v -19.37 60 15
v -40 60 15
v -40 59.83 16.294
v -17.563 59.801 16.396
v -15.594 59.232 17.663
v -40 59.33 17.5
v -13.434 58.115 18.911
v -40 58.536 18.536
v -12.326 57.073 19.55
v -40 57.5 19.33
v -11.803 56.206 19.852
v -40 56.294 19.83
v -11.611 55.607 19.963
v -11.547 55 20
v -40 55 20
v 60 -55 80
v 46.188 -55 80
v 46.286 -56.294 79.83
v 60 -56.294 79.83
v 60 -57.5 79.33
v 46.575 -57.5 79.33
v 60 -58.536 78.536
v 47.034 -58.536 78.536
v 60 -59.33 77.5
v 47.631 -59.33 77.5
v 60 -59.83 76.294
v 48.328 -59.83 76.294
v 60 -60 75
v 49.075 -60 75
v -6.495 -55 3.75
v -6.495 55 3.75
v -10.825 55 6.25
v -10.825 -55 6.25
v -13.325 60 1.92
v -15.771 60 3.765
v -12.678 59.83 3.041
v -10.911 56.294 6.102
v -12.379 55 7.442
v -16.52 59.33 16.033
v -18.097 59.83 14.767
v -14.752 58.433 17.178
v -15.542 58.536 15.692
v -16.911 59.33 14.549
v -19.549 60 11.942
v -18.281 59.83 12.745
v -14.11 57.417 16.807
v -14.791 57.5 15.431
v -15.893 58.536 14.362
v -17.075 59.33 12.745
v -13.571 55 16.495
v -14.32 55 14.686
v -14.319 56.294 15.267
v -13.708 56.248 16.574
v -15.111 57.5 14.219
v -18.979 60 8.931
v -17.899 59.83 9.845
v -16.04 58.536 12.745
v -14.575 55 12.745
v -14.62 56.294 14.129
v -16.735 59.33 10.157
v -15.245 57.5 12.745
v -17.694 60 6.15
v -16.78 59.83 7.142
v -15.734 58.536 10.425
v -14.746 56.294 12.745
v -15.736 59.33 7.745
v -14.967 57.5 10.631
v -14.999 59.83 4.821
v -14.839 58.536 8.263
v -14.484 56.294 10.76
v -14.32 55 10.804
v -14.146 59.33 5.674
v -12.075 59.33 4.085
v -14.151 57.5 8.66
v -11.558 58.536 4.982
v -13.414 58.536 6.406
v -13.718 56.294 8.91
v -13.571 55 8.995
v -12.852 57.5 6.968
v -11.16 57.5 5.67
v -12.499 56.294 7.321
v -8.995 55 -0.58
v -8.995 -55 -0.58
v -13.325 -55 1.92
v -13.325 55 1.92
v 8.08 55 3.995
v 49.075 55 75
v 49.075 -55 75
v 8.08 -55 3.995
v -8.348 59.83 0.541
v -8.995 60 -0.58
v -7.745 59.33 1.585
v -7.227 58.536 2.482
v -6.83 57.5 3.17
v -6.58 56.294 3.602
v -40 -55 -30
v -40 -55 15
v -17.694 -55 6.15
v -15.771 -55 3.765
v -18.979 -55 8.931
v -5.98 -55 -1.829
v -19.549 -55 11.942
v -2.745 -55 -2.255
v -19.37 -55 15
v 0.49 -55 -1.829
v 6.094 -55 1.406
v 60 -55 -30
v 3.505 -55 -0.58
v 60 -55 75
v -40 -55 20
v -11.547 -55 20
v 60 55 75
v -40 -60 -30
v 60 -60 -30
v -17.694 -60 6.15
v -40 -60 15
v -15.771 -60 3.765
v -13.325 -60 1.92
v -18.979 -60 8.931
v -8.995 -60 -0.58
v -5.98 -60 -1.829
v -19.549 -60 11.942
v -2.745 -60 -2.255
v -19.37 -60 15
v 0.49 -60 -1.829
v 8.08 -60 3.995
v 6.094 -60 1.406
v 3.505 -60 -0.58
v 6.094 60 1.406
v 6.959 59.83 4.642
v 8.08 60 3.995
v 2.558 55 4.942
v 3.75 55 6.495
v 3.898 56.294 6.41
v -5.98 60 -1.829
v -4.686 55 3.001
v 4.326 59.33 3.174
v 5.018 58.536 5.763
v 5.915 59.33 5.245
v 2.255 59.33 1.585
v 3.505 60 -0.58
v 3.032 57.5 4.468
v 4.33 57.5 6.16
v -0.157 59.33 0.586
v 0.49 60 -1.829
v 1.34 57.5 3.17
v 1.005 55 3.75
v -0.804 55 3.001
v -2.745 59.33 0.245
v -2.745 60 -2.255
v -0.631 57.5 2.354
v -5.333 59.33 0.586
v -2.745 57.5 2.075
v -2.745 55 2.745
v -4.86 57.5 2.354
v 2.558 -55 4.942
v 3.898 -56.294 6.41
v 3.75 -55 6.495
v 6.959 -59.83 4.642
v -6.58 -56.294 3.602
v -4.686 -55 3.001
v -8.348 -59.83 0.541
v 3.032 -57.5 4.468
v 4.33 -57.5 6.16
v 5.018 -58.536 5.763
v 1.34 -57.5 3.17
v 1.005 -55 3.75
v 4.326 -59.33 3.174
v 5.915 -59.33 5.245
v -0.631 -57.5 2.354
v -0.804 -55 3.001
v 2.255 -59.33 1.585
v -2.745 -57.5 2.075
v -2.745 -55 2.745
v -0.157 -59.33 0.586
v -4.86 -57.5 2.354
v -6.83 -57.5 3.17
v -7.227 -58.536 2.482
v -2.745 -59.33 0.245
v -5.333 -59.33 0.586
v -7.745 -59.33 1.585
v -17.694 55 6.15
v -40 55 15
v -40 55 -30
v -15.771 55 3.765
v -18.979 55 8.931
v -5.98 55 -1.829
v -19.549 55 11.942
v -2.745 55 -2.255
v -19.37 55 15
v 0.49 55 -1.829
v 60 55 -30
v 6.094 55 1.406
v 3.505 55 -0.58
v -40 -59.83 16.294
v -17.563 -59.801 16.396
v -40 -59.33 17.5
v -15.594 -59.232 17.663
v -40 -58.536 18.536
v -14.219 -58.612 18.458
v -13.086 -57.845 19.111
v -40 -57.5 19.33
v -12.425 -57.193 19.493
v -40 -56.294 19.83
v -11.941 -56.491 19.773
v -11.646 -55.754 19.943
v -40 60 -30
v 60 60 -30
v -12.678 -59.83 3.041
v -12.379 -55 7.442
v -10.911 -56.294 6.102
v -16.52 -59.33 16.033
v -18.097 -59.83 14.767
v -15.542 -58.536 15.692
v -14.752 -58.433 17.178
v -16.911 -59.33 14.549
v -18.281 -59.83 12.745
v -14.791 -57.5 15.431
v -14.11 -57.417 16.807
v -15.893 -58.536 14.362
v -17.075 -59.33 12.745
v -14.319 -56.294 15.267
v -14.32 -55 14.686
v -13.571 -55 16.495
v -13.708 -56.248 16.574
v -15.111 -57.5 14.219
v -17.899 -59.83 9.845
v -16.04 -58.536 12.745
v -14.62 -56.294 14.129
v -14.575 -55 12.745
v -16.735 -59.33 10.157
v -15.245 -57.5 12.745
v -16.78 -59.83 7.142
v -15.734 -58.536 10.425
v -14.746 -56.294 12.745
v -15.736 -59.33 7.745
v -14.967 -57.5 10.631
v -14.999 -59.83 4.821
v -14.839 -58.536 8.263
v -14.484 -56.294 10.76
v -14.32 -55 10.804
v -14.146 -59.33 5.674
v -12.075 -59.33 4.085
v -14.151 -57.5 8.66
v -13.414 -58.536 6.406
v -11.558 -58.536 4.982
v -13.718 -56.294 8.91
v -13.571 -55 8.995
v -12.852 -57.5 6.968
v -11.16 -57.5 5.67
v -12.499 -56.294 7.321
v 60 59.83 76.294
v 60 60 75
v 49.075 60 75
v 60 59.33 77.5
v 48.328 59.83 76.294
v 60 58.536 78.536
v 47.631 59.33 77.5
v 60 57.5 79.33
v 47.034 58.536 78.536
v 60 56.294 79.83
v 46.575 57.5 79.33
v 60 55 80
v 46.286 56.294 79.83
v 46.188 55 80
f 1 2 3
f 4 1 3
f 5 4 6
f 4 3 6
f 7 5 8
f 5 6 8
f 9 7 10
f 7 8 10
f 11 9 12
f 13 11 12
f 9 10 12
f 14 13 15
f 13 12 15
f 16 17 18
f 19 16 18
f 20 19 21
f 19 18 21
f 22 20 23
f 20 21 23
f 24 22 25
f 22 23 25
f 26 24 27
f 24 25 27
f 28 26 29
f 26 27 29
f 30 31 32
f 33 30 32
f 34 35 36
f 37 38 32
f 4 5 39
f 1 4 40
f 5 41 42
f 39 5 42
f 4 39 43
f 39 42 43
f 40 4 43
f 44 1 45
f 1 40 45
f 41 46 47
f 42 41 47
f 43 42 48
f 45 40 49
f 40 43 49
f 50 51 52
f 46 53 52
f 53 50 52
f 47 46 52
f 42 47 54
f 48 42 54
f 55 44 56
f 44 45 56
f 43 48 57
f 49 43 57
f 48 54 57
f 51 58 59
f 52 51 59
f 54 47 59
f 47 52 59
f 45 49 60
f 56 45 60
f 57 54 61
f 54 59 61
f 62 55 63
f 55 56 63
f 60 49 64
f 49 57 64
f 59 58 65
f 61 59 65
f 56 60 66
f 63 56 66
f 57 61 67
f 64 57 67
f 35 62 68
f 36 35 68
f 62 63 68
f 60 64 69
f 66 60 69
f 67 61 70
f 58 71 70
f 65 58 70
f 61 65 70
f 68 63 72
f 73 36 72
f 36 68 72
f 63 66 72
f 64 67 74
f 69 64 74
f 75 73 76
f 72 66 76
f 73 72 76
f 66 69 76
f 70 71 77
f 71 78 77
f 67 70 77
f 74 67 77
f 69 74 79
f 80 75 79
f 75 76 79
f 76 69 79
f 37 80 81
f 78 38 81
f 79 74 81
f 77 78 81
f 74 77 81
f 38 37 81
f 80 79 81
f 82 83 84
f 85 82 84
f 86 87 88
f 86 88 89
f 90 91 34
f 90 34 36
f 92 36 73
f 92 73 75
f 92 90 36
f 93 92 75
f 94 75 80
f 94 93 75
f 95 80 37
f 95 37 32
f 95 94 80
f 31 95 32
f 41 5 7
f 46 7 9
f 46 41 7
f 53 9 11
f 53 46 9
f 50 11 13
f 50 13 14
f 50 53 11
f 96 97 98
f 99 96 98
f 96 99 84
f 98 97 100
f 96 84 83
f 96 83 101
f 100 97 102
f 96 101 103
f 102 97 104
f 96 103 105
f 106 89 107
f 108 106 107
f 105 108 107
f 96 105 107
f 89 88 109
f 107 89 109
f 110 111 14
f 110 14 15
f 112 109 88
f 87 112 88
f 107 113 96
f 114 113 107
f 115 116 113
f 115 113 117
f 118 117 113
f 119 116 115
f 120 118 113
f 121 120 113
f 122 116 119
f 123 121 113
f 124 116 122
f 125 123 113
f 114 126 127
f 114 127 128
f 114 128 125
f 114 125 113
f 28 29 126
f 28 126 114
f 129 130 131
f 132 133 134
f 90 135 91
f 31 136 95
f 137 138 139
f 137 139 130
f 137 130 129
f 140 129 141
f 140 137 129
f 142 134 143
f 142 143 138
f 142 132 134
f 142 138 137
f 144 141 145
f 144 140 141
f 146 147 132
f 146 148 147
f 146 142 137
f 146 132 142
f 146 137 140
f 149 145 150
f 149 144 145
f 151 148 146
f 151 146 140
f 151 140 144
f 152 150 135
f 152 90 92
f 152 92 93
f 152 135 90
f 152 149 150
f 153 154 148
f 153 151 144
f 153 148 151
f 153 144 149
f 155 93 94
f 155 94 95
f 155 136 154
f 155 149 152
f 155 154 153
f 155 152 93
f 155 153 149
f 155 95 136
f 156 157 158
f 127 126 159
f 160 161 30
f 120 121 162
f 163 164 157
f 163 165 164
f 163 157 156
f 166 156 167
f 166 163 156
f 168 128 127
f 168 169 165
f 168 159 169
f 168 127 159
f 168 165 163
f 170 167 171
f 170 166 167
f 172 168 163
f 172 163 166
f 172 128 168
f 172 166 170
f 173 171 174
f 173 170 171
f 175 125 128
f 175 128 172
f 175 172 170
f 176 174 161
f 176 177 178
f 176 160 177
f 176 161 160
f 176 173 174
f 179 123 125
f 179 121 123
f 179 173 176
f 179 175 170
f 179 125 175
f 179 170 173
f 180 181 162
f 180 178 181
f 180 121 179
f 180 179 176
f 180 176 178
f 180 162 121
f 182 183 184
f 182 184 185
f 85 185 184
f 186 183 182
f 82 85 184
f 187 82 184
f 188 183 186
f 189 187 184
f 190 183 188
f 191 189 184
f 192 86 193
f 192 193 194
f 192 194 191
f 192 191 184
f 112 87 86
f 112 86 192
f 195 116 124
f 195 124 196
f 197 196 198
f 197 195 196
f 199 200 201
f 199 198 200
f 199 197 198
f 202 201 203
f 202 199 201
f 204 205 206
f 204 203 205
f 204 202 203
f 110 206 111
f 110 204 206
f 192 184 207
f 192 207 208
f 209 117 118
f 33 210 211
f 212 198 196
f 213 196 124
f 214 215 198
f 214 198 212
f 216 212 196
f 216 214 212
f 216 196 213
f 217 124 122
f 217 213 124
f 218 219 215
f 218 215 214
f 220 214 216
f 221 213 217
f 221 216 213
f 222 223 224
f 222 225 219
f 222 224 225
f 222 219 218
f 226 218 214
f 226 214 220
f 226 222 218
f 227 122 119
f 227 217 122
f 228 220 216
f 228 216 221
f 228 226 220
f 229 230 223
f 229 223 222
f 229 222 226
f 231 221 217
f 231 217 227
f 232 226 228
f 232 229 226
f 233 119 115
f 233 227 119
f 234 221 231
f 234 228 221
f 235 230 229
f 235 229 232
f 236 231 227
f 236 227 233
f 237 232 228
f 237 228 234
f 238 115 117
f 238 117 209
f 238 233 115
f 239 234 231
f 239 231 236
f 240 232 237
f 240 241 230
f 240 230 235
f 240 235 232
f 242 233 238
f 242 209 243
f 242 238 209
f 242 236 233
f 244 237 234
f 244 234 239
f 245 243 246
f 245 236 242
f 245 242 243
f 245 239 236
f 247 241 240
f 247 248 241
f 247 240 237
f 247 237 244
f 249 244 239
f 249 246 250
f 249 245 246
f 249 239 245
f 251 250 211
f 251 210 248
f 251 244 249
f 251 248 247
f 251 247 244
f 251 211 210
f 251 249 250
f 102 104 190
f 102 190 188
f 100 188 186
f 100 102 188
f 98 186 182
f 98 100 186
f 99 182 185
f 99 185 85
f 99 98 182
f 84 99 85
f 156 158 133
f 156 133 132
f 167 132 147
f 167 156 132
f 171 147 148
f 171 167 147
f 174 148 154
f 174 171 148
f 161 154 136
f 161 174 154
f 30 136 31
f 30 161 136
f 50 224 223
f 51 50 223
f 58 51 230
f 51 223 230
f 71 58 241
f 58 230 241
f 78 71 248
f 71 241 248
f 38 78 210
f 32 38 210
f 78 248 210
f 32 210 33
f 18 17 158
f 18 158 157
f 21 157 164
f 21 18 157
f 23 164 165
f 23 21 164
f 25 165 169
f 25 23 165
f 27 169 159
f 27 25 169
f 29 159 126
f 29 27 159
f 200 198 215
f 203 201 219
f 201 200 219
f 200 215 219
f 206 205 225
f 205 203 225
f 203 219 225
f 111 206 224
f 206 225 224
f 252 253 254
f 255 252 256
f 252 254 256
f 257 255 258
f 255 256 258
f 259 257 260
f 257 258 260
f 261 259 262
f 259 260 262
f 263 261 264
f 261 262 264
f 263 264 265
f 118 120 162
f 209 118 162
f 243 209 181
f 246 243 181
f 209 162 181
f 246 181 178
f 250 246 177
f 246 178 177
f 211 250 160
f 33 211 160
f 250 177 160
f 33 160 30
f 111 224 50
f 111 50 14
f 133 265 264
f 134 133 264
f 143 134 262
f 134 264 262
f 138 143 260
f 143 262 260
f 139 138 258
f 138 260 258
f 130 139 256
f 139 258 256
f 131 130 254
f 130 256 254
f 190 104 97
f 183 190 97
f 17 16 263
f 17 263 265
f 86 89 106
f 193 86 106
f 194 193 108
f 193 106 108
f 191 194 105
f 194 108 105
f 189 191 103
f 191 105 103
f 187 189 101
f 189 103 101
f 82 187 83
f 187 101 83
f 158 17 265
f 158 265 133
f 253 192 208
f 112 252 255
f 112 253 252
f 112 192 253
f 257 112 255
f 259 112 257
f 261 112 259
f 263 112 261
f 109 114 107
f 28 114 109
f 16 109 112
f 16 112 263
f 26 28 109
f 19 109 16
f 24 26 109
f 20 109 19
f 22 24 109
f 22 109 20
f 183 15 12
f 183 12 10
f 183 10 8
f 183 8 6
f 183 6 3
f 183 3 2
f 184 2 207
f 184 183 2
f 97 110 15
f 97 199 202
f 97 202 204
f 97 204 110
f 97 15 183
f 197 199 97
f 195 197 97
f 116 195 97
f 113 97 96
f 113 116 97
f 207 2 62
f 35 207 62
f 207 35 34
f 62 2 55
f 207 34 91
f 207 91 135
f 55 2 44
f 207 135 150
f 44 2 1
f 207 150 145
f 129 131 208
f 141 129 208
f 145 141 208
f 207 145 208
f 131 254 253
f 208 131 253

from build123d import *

# Parameters (mm, degrees)
F0_W         = 60
F0_H         = 30
F1_DEPTH     = 60
F2_R         = 7.5
F3_T1_DEPTH  = 38.8119784648
F3_T3_DEPTH  = 97.3760430703
F3_T5_DEPTH  = 5
F3_T7_DEPTH  = 16.5470053838
F3_T9_DEPTH  = 53.4529946162
F3_T12_ANGLE = 90
F3_T14_ANGLE = 90
F3_T16_ANGLE = 90
F3_T18_ANGLE = 90
F4_T         = 5


# Not quite as in the source:
# - a fillet or chamfer that OpenCascade refuses, or shapes differently, is made with other operations: its cross-section is extruded or revolved along the edge and cut away or added
# - a shell that OpenCascade refuses in one call is made with other operations: the cavity is built on its own and cut out


with BuildPart() as f1:
    # F0 (on Front) → F1 (new body, symmetric)
    with BuildSketch(Plane.XZ):
        Polygon((46.1880215352, 80), (0, 0), (60, 0), (60, 80), align=None)
        with Locations((30, -15)):
            Rectangle(F0_W, F0_H)
        Polygon((0, -30), (0, 0), (-17.3205080757, 10), (-11.5470053838, 20), (-40, 20), (-40, -30), align=None)
    extrude(amount=F1_DEPTH, both=True)

    # F2
    f2_edges = [f1.edges().sort_by_distance(p)[0] for p in [
        (-17.320508, 0, 10),
        (0, 0, 0),
    ]]
    fillet(f2_edges, radius=F2_R)

    # F3: fillet of radius 5 on 14 edges, made by hand

    # F3_s2 → F3_t1 (cut)
    with BuildSketch(Plane.YZ.offset(33.6880215352)):
        with BuildLine():
            ThreePointArc((-55, 80), (-58.5355339059, 78.5355339059), (-60, 75))
            Line((-60, 75), (-60, 80))
            Line((-60, 80), (-55, 80))
        make_face()
        with BuildLine():
            ThreePointArc((60, 75), (58.5355339059, 78.5355339059), (55, 80))
            Line((55, 80), (60, 80))
            Line((60, 80), (60, 75))
        make_face()
    extrude(amount=F3_T1_DEPTH, mode=Mode.SUBTRACT)

    # F3_s4 → F3_t3 (cut)
    with BuildSketch(Plane(origin=(52.4380215352, 0, 90.8253175473), x_dir=(0, 1, 0), z_dir=(-0.5, 0, -0.8660254038))):
        with BuildLine():
            ThreePointArc((-55, 0), (-58.5355339059, 1.4644660941), (-60, 5))
            Line((-60, 5), (-60, 0))
            Line((-60, 0), (-55, 0))
        make_face()
        with BuildLine():
            ThreePointArc((55, 0), (58.5355339059, 1.4644660941), (60, 5))
            Line((60, 5), (60, 0))
            Line((60, 0), (55, 0))
        make_face()
    extrude(amount=F3_T3_DEPTH, mode=Mode.SUBTRACT)

    # F3_s6 → F3_t5 (cut)
    with BuildSketch(Plane(origin=(-6.4951905284, 0, 3.75), x_dir=(0, 1, 0), z_dir=(-0.8660254038, 0, 0.5))):
        with BuildLine():
            ThreePointArc((-60, 5), (-58.5355339059, 1.4644660941), (-55, 0))
            Line((-55, 0), (-60, 0))
            Line((-60, 0), (-60, 5))
        make_face()
        with BuildLine():
            ThreePointArc((60, 5), (58.5355339059, 1.4644660941), (55, 0))
            Line((55, 0), (60, 0))
            Line((60, 0), (60, 5))
        make_face()
    extrude(amount=F3_T5_DEPTH, mode=Mode.SUBTRACT)

    # F3_s8 → F3_t7 (cut)
    with BuildSketch(Plane(origin=(3.75, 0, 6.4951905284), x_dir=(0, 1, 0), z_dir=(0.5, 0, 0.8660254038))):
        with BuildLine():
            ThreePointArc((-60, 25), (-58.5355339059, 21.4644660941), (-55, 20))
            Line((-55, 20), (-60, 20))
            Line((-60, 20), (-60, 25))
        make_face()
        with BuildLine():
            ThreePointArc((60, 25), (58.5355339059, 21.4644660941), (55, 20))
            Line((55, 20), (60, 20))
            Line((60, 20), (60, 25))
        make_face()
    extrude(amount=F3_T7_DEPTH, mode=Mode.SUBTRACT)

    # F3_s10 → F3_t9 (cut)
    with BuildSketch(Plane.YZ.offset(-52.5)):
        with BuildLine():
            ThreePointArc((-60, 15), (-58.5355339059, 18.5355339059), (-55, 20))
            Line((-55, 20), (-60, 20))
            Line((-60, 20), (-60, 15))
        make_face()
        with BuildLine():
            ThreePointArc((60, 15), (58.5355339059, 18.5355339059), (55, 20))
            Line((55, 20), (60, 20))
            Line((60, 20), (60, 15))
        make_face()
    extrude(amount=F3_T9_DEPTH, mode=Mode.SUBTRACT)

    # F3_s11 → F3_t12 (revolve, cut)
    with BuildSketch(Plane(origin=(3.75, 0, 6.4951905284), x_dir=(0, 1, 0), z_dir=(0.5, 0, 0.8660254038))):
        with BuildLine():
            ThreePointArc((60, -5), (58.5355339059, -1.4644660941), (55, 0))
            Line((55, 0), (60, 0))
            Line((60, 0), (60, -5))
        make_face()
    revolve(axis=Axis((-2.7451905284, 60, 10.2451905284), (0, 1, 0)), revolution_arc=F3_T12_ANGLE, mode=Mode.SUBTRACT)

    # F3_s13 → F3_t14 (revolve, cut)
    with BuildSketch(Plane(origin=(3.75, 0, 6.4951905284), x_dir=(0, 1, 0), z_dir=(0.5, 0, 0.8660254038))):
        with BuildLine():
            ThreePointArc((60, 25), (58.5355339059, 21.4644660941), (55, 20))
            Line((55, 20), (60, 20))
            Line((60, 20), (60, 25))
        make_face()
    revolve(axis=Axis((-7.0753175473, 60, 12.7451905284), (0, -1, 0)), revolution_arc=F3_T14_ANGLE, mode=Mode.SUBTRACT)

    # F3_s15 → F3_t16 (revolve, cut)
    with BuildSketch(Plane(origin=(3.75, 0, 6.4951905284), x_dir=(0, 1, 0), z_dir=(0.5, 0, 0.8660254038))):
        with BuildLine():
            ThreePointArc((-55, 0), (-58.5355339059, -1.4644660941), (-60, -5))
            Line((-60, -5), (-60, 0))
            Line((-60, 0), (-55, 0))
        make_face()
    revolve(axis=Axis((-2.7451905284, -60, 10.2451905284), (0, 1, 0)), revolution_arc=F3_T16_ANGLE, mode=Mode.SUBTRACT)

    # F3_s17 → F3_t18 (revolve, cut)
    with BuildSketch(Plane(origin=(3.75, 0, 6.4951905284), x_dir=(0, 1, 0), z_dir=(0.5, 0, 0.8660254038))):
        with BuildLine():
            ThreePointArc((-60, 25), (-58.5355339059, 21.4644660941), (-55, 20))
            Line((-55, 20), (-60, 20))
            Line((-60, 20), (-60, 25))
        make_face()
    revolve(axis=Axis((-7.0753175473, -60, 12.7451905284), (0, -1, 0)), revolution_arc=F3_T18_ANGLE, mode=Mode.SUBTRACT)

    # F4: shell of thickness 5, made by hand


with BuildPart() as f4_core1:
    # F4_t2: copy of F1
    add(f1.part)

    # the walls: a layer under each face that stays
    f4_faces = [f4_core1.faces().sort_by_distance(p)[0] for p in [
        (24.9690107676, 0, 43.2475952642),
        (53.0940107676, 0, 80),
        (-0.8040476901, 0, 3.0007468312),
        (-23.3333333333, -60, -12.5),
        (-8.6602540378, 0, 5),
        (-23.3333333333, 60, -12.5),
        (-14.3197612445, 0, 10.8040476901),
        (-25.7735026919, 0, 20),
        (-12.5587567297, 0, 18.2475952642),
    ]]
    thicken(f4_faces, amount=-F4_T, mode=Mode.SUBTRACT)


with BuildPart() as f1_1:
    add(f1.part)

    # what is left inside the walls is the cavity
    f4_cavity = [f4_core1.part.solids().sort_by_distance(p)[0] for p in [
        (59.95, 18.333333, 22.5),
    ]]
    add(f4_cavity, mode=Mode.SUBTRACT)


solid = f1_1.part
